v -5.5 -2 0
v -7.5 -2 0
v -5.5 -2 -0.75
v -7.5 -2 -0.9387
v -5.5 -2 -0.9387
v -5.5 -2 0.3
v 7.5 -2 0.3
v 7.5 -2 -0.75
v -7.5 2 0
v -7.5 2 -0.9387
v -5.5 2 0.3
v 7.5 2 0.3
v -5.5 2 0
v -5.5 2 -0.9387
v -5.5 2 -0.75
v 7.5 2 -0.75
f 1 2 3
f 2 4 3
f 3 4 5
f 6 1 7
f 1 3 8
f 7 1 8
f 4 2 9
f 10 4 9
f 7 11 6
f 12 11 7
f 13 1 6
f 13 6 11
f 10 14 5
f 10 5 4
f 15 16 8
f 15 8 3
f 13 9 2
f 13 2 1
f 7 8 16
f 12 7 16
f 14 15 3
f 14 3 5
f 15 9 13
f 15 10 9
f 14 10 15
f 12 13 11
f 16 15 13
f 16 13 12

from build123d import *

# Parameters (mm, degrees)
SCHIZZO1_W                   = 15
SCHIZZO1_H                   = 4
ESTRUSIONE_ESTRUSIONE1_DEPTH = 1.5
SCHIZZO2_W                   = 13
SCHIZZO2_H                   = 4
ESTRUSIONE_ESTRUSIONE2_DEPTH = 0.3
TAGLIO_ESTRUSIONE1_DEPTH     = 4


with BuildPart() as part:
    # Schizzo1 → Estrusione-Estrusione1 (new body)
    with BuildSketch(Plane.XY):
        Rectangle(SCHIZZO1_W, SCHIZZO1_H)
    extrude(amount=-ESTRUSIONE_ESTRUSIONE1_DEPTH)

    # Schizzo2 → Estrusione-Estrusione2 (add)
    with BuildSketch(Plane.XY):
        with Locations((1, 0)):
            Rectangle(SCHIZZO2_W, SCHIZZO2_H)
    extrude(amount=ESTRUSIONE_ESTRUSIONE2_DEPTH)

    # Schizzo3 → Taglio-Estrusione1 (cut)
    with BuildSketch(Plane(origin=(0, 2, 0), x_dir=(1, 0, 0), z_dir=(0, 1, 0))):
        Polygon((-7.5, 1.5), (7.5, 1.5), (7.5, 0.75), (-5.5, 0.75), (-5.5, 0.938702512), (-7.5, 0.938702512), (-7.5, 0.75), (-7.660914318, 0.75), (-7.660914318, 1.501079849), align=None)
    extrude(amount=-TAGLIO_ESTRUSIONE1_DEPTH, mode=Mode.SUBTRACT)


solid = part.part
